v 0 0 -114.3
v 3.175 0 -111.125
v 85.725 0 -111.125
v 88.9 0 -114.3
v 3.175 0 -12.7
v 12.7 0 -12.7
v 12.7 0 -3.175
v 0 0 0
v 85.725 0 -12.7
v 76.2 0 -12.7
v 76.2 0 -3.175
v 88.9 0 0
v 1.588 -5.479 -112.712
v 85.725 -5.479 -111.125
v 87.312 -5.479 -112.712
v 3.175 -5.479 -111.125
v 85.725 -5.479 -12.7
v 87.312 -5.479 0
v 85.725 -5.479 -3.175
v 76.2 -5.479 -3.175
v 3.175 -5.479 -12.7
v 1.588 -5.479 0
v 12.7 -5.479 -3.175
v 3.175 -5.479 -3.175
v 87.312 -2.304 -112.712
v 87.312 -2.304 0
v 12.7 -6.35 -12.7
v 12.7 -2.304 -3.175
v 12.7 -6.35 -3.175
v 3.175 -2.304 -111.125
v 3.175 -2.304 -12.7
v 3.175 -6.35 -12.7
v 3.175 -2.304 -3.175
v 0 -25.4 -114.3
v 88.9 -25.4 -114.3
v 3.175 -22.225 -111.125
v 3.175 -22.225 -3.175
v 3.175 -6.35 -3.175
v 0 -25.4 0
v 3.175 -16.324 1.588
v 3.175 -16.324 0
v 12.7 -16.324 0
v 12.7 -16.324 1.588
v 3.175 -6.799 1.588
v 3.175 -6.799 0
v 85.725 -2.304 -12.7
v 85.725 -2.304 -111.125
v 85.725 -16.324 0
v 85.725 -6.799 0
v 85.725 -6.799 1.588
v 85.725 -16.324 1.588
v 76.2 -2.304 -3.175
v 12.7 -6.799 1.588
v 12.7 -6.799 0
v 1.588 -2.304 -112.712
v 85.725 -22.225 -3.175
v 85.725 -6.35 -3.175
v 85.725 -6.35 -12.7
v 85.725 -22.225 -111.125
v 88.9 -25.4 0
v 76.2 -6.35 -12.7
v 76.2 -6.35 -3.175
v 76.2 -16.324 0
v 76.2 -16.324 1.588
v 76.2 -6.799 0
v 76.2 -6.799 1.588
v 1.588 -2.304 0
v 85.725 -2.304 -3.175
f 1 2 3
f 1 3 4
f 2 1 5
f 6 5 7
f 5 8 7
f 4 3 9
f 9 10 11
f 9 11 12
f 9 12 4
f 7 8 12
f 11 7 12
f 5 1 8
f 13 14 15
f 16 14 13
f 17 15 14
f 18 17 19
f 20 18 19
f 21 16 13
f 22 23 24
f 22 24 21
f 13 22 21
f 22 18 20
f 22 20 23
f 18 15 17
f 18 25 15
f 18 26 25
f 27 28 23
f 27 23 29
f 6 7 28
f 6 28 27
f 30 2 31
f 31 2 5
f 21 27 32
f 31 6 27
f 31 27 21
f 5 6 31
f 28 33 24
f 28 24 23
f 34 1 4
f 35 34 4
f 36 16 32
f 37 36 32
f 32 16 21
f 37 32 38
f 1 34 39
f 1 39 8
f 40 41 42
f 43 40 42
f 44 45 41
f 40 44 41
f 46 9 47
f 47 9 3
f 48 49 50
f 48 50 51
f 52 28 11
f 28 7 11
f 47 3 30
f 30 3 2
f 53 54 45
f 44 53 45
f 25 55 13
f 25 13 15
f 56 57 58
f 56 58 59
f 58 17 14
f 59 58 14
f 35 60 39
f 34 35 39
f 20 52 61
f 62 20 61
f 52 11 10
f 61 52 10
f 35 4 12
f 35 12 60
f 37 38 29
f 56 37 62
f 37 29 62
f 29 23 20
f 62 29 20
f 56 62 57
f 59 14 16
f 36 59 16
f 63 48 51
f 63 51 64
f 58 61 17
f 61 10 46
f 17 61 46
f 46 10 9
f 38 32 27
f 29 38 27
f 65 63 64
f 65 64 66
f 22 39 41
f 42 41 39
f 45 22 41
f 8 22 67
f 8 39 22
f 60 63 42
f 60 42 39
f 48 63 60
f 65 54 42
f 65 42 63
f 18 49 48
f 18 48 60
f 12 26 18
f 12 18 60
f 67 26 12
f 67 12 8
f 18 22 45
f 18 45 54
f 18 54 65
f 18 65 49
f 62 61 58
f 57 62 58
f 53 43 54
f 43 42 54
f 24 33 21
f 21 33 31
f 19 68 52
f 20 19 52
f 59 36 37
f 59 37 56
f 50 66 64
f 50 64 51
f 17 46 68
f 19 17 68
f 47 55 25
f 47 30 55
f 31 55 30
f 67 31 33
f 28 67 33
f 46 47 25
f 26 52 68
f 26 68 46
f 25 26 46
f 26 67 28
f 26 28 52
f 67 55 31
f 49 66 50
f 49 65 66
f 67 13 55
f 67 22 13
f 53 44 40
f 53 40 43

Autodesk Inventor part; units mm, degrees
ref_plane "YZ Plane" through (0, 0, 0) normal (1, 0, 0) x (0, 1, 0)
ref_plane "XZ Plane" through (0, 0, 0) normal (0, 1, 0) x (-1, 0, 0)
ref_plane "XY Plane" through (0, 0, 0) normal (0, 0, 1) x (1, 0, 0)
sketch "Sketch1" plane through (0, 0, 0) normal (0, 0, 1) x (1, 0, 0)
  line L0 (0, 0) -> (88.9, 0)
  line L1 (88.9, 0) -> (88.9, -25.4)
  line L2 (88.9, -25.4) -> (0, -25.4)
  line L3 (0, -25.4) -> (0, 0)
  dimension "d0" = 88.9
  dimension "d1" = 25.4
extrude "Extrusion1" add sketch "Sketch1" against normal blind 114.3
sketch "Sketch2" plane through (0, 0, 0) normal (0, 1, 0) x (1, 0, 0)
  line L0 (0, 0) -> (88.9, 0) projected
  line L1 (88.9, 0) -> (88.9, 114.3) projected
  line L2 (0, 114.3) -> (88.9, 114.3) projected
  line L3 (0, 0) -> (0, 114.3) projected
  line L4 (3.175, 3.175) -> (85.725, 3.175)
  line L5 (85.725, 3.175) -> (85.725, 111.125)
  line L6 (85.725, 111.125) -> (3.175, 111.125)
  line L7 (3.175, 111.125) -> (3.175, 3.175)
  dimension "d4" = 3.175
  dimension "d5" = 3.175
  dimension "d6" = 3.175
  dimension "d7" = 3.175
extrude "Extrusion2" cut sketch "Sketch2" against normal blind 22.225 contours L7 L6 L5 L4
sketch "Sketch3" plane through (0, 0, 0) normal (0, 0, 1) x (1, 0, 0)
  line L0 (0, -25.4) -> (0, 0) projected
  line L1 (88.9, 0) -> (88.9, -25.4) projected
  line L2 (0, -25.4) -> (0, 0) projected
  line L3 (88.9, 0) -> (88.9, -25.4) projected
  line L4 (1.5875, -2.3041) -> (87.3125, -2.3041)
  line L5 (87.3125, -2.3041) -> (87.3125, -5.4791)
  line L6 (87.3125, -5.4791) -> (1.5875, -5.4791)
  line L7 (1.5875, -5.4791) -> (1.5875, -2.3041)
  dimension "d46" = 3.175
  dimension "d47" = 1.5875
  dimension "d49" = 1.5875
extrude "Extrusion3" cut sketch "Sketch3" against normal blind 112.7125
sketch "Sketch5" plane through (0, 0, 0) normal (0, 1, 0) x (1, 0, 0)
  line L0 (3.175, 3.175) -> (3.175, 111.125) projected
  line L1 (3.175, 3.175) -> (12.7, 3.175)
  line L2 (12.7, 3.175) -> (12.7, 12.7)
  line L3 (12.7, 12.7) -> (3.175, 12.7)
  line L4 (3.175, 12.7) -> (3.175, 3.175)
  line L5 (85.725, 3.175) -> (76.2, 3.175)
  line L6 (76.2, 3.175) -> (76.2, 12.7)
  line L7 (76.2, 12.7) -> (85.725, 12.7)
  line L8 (85.725, 12.7) -> (85.725, 3.175)
  dimension "d64" = 9.525
  dimension "d67" = 9.525
  dimension "d68" = 9.525
  dimension "d69" = 9.525
extrude "Extrusion4" add sketch "Sketch5" against normal blind 6.35
sketch "Sketch6" plane through (0, 0, 0) normal (0, 0, 1) x (1, 0, 0)
  line L0 (12.7, -6.7991) -> (3.175, -6.7991)
  line L1 (3.175, -6.7991) -> (3.175, -16.3241)
  line L2 (3.175, -16.3241) -> (12.7, -16.3241)
  line L3 (12.7, -16.3241) -> (12.7, -6.7991)
  line L4 (76.2, -6.7991) -> (85.725, -6.7991)
  line L5 (85.725, -6.7991) -> (85.725, -16.3241)
  line L6 (85.725, -16.3241) -> (76.2, -16.3241)
  line L7 (76.2, -16.3241) -> (76.2, -6.7991)
  line L8 (87.3125, -5.4791) -> (1.5875, -5.4791) projected
  line L9 (0, -25.4) -> (0, 0) projected
  line L10 (88.9, 0) -> (88.9, -25.4) projected
  dimension "d70" = 9.525
  dimension "d71" = 9.525
  dimension "d72" = 9.525
  dimension "d73" = 9.525
  dimension "d76" = 1.32
  dimension "d77" = 1.32
  dimension "d78" = 3.175
  dimension "d79" = 3.175
extrude "Extrusion5" add sketch "Sketch6" along normal blind 1.5875
equation "\"d49\" = d47"
equation "\"d65\" = d62"
equation "\"d73\" = d71"
equation "\"d79\" = d78"
equation "\"d62\" = 6.35"
properties part number "Electronics Container"
